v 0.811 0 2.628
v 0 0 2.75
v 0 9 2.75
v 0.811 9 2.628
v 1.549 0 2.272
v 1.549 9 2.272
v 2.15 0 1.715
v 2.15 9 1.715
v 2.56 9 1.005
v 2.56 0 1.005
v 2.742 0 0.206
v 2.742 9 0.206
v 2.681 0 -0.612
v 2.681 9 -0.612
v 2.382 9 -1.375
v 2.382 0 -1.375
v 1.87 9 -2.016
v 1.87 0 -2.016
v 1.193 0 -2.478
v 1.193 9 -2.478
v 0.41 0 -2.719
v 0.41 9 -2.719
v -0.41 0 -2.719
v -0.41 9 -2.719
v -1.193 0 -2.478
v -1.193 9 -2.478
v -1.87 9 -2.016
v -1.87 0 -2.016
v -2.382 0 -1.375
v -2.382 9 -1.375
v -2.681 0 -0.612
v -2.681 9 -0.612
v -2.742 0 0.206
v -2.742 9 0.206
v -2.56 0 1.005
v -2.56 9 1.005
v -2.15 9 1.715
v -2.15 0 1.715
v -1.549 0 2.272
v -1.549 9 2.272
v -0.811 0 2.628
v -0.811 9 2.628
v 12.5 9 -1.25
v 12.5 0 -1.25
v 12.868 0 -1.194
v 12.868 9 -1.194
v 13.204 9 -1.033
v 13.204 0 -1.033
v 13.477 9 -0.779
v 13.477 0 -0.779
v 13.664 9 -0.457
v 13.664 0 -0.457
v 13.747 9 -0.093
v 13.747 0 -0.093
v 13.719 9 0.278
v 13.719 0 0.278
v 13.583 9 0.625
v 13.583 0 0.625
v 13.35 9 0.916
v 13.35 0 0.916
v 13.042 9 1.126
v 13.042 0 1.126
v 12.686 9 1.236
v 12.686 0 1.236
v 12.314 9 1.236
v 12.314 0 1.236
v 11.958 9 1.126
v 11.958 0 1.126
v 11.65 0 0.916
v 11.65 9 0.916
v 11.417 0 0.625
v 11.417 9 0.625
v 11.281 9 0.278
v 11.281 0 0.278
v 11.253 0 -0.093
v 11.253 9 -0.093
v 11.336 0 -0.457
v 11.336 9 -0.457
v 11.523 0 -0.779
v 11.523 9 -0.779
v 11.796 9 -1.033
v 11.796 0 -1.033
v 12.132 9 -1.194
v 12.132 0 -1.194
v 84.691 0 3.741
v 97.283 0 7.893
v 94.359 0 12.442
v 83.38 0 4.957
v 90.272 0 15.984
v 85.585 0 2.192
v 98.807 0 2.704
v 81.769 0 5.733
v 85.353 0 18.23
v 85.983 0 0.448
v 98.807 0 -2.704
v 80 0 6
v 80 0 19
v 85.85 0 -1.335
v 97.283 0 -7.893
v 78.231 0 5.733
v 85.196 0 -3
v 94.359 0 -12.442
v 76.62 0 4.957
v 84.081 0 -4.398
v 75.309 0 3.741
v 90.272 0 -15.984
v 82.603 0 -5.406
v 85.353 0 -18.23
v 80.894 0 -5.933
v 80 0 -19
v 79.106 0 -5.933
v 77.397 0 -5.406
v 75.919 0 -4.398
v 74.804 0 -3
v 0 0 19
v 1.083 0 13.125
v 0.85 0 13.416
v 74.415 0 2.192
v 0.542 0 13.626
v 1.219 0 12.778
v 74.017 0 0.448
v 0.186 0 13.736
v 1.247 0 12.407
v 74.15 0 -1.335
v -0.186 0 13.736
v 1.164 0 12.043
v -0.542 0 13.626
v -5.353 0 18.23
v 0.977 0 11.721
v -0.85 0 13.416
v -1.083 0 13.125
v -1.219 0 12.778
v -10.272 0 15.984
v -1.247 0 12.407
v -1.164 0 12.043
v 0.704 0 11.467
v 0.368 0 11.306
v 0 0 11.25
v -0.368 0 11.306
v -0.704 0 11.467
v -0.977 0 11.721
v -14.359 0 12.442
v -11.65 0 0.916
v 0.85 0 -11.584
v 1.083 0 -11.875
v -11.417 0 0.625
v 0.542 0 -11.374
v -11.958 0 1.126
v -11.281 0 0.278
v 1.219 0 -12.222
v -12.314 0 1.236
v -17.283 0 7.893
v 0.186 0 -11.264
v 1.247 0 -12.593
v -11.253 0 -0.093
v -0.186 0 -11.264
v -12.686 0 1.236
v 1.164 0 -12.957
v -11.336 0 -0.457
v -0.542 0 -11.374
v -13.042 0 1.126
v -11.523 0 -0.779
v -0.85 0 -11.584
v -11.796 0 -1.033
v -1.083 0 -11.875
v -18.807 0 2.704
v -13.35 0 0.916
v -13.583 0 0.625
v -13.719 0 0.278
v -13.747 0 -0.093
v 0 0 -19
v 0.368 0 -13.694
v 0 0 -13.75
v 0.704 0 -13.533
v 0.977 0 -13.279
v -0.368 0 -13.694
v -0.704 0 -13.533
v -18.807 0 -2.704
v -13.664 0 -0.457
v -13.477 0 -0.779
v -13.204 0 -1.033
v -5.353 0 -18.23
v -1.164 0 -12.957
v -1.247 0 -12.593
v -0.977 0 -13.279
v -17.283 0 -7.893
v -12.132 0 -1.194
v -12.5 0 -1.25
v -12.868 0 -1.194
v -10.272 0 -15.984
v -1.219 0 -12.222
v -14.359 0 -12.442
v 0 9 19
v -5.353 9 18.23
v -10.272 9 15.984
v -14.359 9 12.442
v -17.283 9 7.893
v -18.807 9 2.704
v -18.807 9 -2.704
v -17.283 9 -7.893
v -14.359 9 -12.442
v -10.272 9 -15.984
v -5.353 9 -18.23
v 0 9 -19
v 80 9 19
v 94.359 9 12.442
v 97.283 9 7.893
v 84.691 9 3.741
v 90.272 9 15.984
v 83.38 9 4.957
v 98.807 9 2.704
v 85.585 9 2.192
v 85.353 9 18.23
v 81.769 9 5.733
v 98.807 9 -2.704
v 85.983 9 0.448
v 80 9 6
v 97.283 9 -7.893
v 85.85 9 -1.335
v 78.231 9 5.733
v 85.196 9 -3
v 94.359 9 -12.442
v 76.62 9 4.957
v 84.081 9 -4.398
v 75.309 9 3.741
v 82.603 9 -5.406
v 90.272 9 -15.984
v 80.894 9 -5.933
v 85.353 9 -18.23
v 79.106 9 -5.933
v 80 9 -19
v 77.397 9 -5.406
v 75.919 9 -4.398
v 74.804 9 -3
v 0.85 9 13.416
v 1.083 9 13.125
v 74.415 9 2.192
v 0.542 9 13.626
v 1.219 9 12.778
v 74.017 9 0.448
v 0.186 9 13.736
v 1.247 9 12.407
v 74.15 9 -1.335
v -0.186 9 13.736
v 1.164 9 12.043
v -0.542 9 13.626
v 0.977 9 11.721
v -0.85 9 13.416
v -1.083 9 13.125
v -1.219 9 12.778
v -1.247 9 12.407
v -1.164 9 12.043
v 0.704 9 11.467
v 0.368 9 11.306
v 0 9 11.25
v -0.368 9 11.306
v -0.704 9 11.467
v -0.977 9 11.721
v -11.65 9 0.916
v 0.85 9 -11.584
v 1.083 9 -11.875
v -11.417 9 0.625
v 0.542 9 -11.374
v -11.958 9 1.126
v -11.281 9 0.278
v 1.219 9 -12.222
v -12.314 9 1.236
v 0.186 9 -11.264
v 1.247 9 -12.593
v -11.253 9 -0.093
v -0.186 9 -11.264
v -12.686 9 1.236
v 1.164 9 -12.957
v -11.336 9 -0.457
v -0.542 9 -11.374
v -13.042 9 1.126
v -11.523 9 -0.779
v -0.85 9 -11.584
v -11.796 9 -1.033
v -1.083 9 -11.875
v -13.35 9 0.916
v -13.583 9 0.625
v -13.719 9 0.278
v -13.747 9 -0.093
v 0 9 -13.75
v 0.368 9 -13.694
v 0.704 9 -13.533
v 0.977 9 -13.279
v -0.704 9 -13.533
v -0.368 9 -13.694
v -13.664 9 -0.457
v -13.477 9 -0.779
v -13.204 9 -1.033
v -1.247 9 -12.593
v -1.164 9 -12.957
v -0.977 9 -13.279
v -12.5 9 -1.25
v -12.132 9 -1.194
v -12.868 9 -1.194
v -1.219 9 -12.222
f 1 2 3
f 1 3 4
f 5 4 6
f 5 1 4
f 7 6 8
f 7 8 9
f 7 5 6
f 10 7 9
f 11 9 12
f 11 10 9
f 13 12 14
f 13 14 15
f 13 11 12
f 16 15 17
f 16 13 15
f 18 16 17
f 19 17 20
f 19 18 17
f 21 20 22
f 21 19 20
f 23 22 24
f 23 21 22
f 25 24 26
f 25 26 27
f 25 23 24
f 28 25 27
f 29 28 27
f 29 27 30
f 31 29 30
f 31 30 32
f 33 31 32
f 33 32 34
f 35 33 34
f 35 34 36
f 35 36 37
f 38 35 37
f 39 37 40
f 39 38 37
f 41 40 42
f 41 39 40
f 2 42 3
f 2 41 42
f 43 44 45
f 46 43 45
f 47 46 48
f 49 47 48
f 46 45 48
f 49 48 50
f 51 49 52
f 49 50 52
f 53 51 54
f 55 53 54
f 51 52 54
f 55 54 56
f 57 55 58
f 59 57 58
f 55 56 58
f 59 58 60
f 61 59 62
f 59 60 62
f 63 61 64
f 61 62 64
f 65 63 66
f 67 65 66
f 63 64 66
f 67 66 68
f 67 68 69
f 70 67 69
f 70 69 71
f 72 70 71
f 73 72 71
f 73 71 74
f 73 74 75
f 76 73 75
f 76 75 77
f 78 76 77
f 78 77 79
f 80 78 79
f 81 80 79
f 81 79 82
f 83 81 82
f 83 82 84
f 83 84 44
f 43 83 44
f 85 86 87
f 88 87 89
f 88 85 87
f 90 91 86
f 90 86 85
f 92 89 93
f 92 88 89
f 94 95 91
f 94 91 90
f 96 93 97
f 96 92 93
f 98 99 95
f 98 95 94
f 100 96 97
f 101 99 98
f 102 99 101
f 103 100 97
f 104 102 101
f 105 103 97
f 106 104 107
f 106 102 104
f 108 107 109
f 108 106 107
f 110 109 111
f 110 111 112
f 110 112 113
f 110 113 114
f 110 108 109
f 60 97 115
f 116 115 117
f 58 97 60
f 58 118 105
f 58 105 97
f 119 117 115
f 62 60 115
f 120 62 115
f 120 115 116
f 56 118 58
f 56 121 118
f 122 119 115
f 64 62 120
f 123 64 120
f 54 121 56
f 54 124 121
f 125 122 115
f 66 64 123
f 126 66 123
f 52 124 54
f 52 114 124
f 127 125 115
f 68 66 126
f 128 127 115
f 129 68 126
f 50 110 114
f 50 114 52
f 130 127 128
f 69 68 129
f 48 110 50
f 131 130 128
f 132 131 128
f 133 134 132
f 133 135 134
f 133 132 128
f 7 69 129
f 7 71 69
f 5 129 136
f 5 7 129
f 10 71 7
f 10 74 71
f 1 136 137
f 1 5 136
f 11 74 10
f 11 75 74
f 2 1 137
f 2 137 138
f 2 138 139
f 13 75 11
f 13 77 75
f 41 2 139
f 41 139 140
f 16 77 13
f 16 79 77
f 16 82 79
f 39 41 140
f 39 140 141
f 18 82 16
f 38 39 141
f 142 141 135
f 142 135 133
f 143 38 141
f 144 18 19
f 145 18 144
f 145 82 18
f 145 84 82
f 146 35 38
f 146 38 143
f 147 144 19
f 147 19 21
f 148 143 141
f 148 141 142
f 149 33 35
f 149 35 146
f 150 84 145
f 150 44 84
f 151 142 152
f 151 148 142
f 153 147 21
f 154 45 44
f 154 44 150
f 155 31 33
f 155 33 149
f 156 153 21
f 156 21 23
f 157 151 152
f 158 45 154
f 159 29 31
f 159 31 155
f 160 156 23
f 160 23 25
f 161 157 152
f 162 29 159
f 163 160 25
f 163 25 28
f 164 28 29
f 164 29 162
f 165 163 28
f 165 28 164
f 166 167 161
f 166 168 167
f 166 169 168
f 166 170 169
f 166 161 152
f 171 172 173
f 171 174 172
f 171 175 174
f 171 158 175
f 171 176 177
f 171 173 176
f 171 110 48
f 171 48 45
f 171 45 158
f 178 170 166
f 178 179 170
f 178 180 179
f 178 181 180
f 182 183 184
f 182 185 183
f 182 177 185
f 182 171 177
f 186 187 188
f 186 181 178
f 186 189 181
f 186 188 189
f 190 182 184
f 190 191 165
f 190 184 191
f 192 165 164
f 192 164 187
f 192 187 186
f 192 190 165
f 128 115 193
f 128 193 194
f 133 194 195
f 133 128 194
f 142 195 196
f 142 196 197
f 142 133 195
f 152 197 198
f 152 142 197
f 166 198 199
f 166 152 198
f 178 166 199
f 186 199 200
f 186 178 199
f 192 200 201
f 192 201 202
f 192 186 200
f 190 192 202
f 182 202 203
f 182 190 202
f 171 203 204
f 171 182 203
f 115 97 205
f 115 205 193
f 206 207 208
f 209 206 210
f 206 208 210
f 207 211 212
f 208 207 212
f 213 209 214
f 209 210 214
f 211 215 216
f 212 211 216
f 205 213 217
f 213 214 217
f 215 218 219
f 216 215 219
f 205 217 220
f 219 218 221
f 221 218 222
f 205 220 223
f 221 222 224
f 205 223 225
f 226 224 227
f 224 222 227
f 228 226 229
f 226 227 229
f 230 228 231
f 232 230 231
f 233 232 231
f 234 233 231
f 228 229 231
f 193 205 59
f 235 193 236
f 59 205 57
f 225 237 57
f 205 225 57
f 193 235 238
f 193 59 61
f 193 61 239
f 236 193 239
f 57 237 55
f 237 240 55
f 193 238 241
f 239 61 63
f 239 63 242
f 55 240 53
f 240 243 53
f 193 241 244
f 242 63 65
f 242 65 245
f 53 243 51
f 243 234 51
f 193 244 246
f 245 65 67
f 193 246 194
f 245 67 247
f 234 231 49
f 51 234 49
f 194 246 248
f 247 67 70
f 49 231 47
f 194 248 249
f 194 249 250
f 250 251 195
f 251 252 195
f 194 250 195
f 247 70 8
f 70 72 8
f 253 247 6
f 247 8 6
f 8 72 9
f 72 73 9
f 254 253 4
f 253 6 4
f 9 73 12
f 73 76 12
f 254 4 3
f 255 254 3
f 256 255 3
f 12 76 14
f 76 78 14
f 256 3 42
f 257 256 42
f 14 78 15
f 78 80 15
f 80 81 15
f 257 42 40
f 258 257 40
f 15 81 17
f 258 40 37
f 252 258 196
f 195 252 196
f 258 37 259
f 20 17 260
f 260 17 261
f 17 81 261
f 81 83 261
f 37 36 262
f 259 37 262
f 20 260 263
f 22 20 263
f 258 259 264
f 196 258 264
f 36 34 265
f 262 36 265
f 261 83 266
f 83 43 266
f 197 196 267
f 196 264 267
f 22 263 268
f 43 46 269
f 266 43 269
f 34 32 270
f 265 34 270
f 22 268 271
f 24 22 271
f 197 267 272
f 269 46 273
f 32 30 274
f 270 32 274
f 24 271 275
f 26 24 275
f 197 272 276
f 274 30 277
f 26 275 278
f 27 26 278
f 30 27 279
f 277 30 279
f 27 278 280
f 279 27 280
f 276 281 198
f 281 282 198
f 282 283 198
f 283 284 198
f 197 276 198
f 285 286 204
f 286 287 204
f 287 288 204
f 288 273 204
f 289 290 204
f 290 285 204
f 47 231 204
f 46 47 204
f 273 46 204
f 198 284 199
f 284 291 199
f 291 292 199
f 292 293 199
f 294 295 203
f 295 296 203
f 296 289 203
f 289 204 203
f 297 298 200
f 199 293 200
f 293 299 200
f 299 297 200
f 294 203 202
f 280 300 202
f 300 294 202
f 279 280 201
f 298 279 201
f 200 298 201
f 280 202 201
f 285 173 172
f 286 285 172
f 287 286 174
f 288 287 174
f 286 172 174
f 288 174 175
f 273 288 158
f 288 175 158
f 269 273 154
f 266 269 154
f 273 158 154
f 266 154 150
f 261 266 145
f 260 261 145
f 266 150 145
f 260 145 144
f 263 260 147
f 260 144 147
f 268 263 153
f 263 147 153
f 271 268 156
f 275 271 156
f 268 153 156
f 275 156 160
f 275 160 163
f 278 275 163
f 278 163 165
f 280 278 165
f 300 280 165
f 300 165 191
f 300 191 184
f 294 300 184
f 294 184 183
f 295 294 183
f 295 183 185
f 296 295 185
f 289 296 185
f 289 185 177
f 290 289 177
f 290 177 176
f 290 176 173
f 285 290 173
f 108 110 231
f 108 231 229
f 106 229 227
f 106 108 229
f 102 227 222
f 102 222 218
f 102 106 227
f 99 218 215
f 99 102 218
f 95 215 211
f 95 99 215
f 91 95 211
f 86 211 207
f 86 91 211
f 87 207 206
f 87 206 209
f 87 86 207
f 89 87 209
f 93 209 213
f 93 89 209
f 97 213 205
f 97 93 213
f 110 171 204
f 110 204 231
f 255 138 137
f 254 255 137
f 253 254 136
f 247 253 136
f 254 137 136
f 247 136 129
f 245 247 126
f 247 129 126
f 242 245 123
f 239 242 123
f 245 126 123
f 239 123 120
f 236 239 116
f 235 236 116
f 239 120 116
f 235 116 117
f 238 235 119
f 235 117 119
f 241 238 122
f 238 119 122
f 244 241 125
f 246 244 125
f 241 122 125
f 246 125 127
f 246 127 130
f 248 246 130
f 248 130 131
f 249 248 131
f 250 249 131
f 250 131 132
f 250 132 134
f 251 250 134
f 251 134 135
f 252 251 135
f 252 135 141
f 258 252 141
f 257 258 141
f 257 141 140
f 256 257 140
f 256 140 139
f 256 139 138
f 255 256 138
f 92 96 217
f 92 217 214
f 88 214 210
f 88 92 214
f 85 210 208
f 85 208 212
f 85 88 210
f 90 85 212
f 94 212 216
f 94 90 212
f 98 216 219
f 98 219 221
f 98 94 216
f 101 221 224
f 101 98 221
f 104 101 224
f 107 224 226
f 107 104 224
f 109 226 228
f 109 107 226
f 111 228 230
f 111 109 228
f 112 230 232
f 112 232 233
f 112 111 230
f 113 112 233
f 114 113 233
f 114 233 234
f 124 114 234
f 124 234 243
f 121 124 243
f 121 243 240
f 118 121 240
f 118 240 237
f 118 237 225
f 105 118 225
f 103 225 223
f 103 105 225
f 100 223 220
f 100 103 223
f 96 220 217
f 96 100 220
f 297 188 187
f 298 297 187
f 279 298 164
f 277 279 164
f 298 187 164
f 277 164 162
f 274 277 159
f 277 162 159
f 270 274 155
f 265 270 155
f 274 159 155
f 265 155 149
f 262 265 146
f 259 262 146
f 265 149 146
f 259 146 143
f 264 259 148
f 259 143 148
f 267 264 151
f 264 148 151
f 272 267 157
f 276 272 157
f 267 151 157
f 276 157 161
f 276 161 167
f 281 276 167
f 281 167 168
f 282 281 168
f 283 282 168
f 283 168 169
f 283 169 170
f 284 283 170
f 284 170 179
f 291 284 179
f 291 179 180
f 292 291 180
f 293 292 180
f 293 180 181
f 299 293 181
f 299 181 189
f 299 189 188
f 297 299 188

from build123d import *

# Parameters (mm, degrees)
SKETCH_1_R         = 2.75
SKETCH_1_R_2       = 6
EXTRUDE_1_DEPTH    = 9
HOLE_WIZARD_M3_1_D = 2.5


with BuildPart() as part:
    # 草图1 → 凸台-拉伸1 (new body)
    with BuildSketch(Plane(origin=(0, 0, 0), x_dir=(1, 0, 0), z_dir=(0, 1, 0))):
        with BuildLine():
            Line((0, 19), (80, 19))
            ThreePointArc((80, 19), (99, 0), (80, -19))
            Line((80, -19), (0, -19))
            ThreePointArc((0, -19), (-19, 0), (0, 19))
        make_face()
        with Locations(Location((0, 0, 0), (0, 0, 270))):
            Circle(SKETCH_1_R, mode=Mode.SUBTRACT)
        with Locations(Location((80, 0, 0), (0, 0, 270))):
            Circle(SKETCH_1_R_2, mode=Mode.SUBTRACT)
    extrude(amount=EXTRUDE_1_DEPTH)

    # M3 螺纹孔的螺纹孔钻头1 (through all)
    with Locations(Plane(origin=(0, 9, -12.5), x_dir=(0, 0, 1), z_dir=(0, 1, 0))):
        with Locations((0, 0), (12.5, 12.5), (25, 0), (12.5, -12.5)):
            Hole(HOLE_WIZARD_M3_1_D / 2)


solid = part.part
